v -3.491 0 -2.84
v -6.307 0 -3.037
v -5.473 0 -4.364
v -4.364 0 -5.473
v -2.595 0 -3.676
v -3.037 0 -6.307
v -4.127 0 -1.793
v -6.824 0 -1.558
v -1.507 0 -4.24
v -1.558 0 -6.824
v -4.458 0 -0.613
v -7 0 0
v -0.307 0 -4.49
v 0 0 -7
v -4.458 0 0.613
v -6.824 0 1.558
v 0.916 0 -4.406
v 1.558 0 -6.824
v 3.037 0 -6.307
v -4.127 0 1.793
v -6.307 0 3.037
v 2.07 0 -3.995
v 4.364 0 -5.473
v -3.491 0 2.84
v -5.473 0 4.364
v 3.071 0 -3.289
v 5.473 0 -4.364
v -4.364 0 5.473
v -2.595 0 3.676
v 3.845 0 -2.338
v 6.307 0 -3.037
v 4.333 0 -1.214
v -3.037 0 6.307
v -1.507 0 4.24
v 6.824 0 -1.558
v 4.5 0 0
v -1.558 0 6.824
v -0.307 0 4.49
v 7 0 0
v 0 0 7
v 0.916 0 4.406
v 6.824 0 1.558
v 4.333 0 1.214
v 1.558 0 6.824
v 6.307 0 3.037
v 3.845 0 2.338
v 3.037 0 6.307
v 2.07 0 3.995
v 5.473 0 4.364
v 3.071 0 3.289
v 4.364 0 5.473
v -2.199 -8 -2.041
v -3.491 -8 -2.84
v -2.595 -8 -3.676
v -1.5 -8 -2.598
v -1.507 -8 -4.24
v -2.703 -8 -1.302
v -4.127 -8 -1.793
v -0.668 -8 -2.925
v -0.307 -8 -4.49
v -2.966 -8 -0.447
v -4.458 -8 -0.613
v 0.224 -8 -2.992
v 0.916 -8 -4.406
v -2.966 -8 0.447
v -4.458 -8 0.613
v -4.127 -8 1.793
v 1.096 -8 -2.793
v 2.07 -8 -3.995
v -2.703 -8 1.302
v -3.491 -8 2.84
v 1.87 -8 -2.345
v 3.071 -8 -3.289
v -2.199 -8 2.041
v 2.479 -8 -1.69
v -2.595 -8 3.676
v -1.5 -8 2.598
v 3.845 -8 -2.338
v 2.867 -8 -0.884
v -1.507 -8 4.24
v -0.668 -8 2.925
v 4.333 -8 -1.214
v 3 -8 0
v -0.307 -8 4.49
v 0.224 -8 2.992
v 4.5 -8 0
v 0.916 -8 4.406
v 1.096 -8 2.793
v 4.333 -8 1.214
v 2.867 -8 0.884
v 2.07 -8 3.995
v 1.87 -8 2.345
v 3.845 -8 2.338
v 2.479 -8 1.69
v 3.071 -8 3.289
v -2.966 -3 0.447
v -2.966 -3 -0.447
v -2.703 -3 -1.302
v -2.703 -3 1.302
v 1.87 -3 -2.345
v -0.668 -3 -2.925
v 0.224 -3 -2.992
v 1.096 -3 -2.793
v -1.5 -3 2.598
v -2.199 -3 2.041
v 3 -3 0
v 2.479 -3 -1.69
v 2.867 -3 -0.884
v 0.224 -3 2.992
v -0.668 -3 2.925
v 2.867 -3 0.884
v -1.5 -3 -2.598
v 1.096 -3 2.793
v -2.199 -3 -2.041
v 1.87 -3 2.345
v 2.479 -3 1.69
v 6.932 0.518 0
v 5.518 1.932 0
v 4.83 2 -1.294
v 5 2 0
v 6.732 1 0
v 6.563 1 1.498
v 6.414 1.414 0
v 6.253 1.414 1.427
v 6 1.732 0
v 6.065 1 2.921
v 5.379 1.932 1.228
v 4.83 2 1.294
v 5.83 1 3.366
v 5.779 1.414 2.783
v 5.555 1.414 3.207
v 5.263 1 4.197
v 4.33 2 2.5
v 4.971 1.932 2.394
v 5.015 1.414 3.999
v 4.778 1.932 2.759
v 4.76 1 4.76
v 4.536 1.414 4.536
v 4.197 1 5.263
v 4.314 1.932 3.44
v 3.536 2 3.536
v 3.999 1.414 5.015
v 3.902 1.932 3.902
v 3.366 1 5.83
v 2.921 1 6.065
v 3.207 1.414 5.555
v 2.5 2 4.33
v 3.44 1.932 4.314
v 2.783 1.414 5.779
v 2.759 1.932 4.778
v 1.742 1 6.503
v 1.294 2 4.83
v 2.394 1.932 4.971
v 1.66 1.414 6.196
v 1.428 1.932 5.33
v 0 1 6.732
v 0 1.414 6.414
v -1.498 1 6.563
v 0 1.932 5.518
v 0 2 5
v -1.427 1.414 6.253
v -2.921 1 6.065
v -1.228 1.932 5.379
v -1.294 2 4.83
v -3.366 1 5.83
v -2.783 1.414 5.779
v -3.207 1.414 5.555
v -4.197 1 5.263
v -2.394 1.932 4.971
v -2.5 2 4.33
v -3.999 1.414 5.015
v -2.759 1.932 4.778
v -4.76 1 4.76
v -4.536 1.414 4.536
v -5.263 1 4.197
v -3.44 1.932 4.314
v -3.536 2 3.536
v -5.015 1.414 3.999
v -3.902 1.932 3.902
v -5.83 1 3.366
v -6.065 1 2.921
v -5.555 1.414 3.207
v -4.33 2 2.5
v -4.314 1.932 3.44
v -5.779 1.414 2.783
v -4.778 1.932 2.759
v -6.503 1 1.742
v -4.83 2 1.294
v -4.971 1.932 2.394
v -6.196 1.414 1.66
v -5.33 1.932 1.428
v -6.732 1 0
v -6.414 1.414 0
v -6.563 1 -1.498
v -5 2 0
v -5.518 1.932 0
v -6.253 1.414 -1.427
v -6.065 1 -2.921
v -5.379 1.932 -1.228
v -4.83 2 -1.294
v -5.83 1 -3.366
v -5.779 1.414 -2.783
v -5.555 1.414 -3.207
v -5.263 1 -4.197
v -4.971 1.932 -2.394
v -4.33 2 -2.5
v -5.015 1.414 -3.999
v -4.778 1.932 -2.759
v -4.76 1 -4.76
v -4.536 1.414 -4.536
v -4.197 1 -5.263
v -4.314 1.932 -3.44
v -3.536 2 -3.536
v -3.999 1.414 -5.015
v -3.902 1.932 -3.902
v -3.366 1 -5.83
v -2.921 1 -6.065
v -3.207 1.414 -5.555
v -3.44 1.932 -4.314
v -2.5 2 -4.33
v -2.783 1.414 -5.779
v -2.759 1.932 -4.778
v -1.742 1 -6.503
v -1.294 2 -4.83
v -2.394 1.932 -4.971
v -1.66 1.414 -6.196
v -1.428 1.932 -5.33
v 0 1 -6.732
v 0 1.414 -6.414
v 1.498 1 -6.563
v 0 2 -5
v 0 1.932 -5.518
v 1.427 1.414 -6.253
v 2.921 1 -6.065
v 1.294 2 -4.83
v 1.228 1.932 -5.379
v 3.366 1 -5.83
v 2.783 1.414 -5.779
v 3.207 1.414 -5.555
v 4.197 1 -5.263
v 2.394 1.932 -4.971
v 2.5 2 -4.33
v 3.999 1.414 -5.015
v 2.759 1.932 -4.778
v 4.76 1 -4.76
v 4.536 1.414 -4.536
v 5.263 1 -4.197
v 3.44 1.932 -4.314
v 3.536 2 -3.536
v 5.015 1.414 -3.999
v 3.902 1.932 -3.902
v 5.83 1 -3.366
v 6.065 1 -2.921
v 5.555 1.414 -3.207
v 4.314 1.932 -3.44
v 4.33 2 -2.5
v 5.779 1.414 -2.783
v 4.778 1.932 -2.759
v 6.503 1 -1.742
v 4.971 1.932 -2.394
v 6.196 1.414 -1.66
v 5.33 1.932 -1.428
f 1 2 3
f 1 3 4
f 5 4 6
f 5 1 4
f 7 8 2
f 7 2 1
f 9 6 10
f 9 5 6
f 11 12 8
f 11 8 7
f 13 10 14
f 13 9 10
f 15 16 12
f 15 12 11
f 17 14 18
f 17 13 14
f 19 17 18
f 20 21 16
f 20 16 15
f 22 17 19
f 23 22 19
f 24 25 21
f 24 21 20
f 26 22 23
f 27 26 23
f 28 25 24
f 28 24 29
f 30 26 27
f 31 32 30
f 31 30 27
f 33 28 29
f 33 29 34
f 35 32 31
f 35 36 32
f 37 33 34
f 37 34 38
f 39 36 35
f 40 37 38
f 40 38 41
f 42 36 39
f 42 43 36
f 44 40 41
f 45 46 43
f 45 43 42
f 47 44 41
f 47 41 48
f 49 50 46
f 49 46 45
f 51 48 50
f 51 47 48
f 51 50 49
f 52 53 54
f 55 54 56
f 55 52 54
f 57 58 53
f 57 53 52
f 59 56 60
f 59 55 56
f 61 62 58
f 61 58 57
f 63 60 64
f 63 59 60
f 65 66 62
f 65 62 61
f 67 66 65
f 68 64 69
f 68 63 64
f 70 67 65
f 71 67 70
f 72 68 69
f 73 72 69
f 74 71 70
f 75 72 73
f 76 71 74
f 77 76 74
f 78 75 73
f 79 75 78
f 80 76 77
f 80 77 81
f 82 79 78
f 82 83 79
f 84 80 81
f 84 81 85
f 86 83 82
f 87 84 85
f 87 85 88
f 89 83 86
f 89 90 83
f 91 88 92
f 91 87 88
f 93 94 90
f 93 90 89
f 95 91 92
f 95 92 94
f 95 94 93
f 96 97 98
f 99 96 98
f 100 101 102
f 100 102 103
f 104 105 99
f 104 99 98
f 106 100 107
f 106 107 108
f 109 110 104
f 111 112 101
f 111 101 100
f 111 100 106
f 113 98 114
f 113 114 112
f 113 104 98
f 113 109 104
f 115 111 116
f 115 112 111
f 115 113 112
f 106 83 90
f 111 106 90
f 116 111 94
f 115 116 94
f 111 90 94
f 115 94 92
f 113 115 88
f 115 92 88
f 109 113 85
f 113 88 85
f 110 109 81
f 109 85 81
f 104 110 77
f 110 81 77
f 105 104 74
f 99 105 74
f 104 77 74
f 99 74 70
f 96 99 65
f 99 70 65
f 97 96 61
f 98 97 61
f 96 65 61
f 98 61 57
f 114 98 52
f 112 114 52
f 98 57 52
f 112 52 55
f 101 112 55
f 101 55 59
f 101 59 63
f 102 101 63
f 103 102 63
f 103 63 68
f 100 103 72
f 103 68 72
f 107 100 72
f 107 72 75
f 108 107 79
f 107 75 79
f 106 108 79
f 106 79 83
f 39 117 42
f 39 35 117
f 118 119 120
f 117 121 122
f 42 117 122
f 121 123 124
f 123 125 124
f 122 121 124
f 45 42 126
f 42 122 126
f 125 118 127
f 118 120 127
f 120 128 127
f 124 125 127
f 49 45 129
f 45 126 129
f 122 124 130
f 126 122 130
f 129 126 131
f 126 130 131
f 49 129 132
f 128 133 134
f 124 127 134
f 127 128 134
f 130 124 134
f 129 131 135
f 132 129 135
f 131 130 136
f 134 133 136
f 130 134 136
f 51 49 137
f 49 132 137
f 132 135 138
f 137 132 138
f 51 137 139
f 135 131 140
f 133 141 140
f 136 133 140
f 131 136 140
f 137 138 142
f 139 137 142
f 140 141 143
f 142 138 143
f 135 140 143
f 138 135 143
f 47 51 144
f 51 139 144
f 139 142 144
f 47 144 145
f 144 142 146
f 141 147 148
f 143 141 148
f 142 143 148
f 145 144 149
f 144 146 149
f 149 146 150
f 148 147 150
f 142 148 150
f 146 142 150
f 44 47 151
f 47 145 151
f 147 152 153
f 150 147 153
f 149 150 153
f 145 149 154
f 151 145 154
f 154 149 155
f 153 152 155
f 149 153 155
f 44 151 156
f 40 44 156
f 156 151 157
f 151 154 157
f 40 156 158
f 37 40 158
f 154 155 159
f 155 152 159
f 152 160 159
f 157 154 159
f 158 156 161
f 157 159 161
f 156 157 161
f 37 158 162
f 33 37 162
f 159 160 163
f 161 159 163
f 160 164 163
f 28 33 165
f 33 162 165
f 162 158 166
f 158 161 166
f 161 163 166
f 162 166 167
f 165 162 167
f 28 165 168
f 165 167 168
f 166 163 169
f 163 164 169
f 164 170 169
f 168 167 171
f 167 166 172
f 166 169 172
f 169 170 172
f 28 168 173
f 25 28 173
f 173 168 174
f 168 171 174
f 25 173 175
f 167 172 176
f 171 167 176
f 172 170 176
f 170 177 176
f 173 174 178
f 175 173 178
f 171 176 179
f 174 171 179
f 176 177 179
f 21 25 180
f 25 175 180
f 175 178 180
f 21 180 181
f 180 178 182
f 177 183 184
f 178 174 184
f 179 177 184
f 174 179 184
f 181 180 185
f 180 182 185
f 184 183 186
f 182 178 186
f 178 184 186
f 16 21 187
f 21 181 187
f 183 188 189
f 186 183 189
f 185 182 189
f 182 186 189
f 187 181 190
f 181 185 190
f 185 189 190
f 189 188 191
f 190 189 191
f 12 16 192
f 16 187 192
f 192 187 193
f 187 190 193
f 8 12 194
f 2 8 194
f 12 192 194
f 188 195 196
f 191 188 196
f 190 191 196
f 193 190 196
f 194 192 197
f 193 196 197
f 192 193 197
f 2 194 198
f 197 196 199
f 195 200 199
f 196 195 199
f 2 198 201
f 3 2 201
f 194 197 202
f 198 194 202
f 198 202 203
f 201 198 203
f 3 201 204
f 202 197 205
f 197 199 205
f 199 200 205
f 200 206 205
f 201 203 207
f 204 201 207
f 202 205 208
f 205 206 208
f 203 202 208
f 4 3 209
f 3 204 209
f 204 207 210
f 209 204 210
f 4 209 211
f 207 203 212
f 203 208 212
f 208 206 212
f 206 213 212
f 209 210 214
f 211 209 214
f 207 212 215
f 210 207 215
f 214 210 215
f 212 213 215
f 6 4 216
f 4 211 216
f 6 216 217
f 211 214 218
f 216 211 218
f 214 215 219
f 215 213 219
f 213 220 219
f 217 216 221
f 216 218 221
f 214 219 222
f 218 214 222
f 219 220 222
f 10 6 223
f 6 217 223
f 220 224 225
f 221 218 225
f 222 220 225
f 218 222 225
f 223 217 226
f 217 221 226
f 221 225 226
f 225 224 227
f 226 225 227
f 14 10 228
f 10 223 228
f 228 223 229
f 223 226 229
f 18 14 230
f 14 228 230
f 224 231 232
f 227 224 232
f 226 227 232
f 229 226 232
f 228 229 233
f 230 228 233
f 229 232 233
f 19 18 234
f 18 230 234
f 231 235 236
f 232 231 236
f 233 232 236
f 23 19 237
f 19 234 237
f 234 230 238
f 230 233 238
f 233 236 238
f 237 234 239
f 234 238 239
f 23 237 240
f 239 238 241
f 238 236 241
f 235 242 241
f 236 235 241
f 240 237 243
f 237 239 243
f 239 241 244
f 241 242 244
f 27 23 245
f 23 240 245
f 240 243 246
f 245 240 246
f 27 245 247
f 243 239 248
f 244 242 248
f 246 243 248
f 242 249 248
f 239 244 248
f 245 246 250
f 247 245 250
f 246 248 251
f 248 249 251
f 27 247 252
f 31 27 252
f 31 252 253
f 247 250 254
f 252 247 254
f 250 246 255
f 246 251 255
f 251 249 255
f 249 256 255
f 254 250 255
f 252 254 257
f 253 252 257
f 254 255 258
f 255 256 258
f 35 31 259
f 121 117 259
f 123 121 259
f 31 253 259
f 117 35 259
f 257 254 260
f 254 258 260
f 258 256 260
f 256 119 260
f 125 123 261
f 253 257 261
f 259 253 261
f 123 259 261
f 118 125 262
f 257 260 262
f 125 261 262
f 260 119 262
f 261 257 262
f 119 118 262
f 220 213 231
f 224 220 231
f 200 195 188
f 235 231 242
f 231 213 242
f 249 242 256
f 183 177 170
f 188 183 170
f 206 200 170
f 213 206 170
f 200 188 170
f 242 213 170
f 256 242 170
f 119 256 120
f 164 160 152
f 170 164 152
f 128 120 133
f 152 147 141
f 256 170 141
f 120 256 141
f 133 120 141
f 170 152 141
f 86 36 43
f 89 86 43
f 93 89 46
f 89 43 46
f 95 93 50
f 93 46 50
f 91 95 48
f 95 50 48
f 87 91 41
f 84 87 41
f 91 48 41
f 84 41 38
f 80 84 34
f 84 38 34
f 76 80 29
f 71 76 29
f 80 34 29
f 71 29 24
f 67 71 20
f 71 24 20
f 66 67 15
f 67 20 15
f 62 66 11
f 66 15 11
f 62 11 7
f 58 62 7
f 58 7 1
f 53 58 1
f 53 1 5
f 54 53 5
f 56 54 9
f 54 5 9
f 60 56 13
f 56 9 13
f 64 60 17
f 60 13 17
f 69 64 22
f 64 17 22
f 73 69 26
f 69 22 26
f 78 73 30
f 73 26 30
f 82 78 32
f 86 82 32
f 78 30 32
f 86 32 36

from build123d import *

# Parameters (mm, degrees)
F0_R     = 4.5
F1_DEPTH = 8
F0_R_2   = 7
F2_DEPTH = 2
F3_R     = 1.99999
F4_R     = 3
F5_DEPTH = 5


# Not quite as in the source:
# - a fillet or chamfer is up to 0.001 mm smaller than in the source, because OpenCascade refuses the exact size


with BuildPart() as f1:
    # F0 (on Front) → F1 (new body)
    with BuildSketch(Plane.XZ):
        Circle(F0_R)
    extrude(amount=F1_DEPTH)

    # F0 (on Front) → F2 (join)
    with BuildSketch(Plane.XZ):
        Circle(F0_R_2)
        Circle(F0_R, mode=Mode.SUBTRACT)
        Circle(F0_R)
    extrude(amount=-F2_DEPTH)

    # F3 (radius 2 in the source; OpenCascade refuses exactly that, so slightly less here)
    f3_edges = [f1.edges().sort_by_distance(p)[0] for p in [
        (-7, 2, 0),
    ]]
    fillet(f3_edges, radius=F3_R)

    # F4 (on face) → F5 (cut)
    with BuildSketch(Plane.XZ.offset(8)):
        Circle(F4_R)
    extrude(amount=-F5_DEPTH, mode=Mode.SUBTRACT)


solid = f1.part
